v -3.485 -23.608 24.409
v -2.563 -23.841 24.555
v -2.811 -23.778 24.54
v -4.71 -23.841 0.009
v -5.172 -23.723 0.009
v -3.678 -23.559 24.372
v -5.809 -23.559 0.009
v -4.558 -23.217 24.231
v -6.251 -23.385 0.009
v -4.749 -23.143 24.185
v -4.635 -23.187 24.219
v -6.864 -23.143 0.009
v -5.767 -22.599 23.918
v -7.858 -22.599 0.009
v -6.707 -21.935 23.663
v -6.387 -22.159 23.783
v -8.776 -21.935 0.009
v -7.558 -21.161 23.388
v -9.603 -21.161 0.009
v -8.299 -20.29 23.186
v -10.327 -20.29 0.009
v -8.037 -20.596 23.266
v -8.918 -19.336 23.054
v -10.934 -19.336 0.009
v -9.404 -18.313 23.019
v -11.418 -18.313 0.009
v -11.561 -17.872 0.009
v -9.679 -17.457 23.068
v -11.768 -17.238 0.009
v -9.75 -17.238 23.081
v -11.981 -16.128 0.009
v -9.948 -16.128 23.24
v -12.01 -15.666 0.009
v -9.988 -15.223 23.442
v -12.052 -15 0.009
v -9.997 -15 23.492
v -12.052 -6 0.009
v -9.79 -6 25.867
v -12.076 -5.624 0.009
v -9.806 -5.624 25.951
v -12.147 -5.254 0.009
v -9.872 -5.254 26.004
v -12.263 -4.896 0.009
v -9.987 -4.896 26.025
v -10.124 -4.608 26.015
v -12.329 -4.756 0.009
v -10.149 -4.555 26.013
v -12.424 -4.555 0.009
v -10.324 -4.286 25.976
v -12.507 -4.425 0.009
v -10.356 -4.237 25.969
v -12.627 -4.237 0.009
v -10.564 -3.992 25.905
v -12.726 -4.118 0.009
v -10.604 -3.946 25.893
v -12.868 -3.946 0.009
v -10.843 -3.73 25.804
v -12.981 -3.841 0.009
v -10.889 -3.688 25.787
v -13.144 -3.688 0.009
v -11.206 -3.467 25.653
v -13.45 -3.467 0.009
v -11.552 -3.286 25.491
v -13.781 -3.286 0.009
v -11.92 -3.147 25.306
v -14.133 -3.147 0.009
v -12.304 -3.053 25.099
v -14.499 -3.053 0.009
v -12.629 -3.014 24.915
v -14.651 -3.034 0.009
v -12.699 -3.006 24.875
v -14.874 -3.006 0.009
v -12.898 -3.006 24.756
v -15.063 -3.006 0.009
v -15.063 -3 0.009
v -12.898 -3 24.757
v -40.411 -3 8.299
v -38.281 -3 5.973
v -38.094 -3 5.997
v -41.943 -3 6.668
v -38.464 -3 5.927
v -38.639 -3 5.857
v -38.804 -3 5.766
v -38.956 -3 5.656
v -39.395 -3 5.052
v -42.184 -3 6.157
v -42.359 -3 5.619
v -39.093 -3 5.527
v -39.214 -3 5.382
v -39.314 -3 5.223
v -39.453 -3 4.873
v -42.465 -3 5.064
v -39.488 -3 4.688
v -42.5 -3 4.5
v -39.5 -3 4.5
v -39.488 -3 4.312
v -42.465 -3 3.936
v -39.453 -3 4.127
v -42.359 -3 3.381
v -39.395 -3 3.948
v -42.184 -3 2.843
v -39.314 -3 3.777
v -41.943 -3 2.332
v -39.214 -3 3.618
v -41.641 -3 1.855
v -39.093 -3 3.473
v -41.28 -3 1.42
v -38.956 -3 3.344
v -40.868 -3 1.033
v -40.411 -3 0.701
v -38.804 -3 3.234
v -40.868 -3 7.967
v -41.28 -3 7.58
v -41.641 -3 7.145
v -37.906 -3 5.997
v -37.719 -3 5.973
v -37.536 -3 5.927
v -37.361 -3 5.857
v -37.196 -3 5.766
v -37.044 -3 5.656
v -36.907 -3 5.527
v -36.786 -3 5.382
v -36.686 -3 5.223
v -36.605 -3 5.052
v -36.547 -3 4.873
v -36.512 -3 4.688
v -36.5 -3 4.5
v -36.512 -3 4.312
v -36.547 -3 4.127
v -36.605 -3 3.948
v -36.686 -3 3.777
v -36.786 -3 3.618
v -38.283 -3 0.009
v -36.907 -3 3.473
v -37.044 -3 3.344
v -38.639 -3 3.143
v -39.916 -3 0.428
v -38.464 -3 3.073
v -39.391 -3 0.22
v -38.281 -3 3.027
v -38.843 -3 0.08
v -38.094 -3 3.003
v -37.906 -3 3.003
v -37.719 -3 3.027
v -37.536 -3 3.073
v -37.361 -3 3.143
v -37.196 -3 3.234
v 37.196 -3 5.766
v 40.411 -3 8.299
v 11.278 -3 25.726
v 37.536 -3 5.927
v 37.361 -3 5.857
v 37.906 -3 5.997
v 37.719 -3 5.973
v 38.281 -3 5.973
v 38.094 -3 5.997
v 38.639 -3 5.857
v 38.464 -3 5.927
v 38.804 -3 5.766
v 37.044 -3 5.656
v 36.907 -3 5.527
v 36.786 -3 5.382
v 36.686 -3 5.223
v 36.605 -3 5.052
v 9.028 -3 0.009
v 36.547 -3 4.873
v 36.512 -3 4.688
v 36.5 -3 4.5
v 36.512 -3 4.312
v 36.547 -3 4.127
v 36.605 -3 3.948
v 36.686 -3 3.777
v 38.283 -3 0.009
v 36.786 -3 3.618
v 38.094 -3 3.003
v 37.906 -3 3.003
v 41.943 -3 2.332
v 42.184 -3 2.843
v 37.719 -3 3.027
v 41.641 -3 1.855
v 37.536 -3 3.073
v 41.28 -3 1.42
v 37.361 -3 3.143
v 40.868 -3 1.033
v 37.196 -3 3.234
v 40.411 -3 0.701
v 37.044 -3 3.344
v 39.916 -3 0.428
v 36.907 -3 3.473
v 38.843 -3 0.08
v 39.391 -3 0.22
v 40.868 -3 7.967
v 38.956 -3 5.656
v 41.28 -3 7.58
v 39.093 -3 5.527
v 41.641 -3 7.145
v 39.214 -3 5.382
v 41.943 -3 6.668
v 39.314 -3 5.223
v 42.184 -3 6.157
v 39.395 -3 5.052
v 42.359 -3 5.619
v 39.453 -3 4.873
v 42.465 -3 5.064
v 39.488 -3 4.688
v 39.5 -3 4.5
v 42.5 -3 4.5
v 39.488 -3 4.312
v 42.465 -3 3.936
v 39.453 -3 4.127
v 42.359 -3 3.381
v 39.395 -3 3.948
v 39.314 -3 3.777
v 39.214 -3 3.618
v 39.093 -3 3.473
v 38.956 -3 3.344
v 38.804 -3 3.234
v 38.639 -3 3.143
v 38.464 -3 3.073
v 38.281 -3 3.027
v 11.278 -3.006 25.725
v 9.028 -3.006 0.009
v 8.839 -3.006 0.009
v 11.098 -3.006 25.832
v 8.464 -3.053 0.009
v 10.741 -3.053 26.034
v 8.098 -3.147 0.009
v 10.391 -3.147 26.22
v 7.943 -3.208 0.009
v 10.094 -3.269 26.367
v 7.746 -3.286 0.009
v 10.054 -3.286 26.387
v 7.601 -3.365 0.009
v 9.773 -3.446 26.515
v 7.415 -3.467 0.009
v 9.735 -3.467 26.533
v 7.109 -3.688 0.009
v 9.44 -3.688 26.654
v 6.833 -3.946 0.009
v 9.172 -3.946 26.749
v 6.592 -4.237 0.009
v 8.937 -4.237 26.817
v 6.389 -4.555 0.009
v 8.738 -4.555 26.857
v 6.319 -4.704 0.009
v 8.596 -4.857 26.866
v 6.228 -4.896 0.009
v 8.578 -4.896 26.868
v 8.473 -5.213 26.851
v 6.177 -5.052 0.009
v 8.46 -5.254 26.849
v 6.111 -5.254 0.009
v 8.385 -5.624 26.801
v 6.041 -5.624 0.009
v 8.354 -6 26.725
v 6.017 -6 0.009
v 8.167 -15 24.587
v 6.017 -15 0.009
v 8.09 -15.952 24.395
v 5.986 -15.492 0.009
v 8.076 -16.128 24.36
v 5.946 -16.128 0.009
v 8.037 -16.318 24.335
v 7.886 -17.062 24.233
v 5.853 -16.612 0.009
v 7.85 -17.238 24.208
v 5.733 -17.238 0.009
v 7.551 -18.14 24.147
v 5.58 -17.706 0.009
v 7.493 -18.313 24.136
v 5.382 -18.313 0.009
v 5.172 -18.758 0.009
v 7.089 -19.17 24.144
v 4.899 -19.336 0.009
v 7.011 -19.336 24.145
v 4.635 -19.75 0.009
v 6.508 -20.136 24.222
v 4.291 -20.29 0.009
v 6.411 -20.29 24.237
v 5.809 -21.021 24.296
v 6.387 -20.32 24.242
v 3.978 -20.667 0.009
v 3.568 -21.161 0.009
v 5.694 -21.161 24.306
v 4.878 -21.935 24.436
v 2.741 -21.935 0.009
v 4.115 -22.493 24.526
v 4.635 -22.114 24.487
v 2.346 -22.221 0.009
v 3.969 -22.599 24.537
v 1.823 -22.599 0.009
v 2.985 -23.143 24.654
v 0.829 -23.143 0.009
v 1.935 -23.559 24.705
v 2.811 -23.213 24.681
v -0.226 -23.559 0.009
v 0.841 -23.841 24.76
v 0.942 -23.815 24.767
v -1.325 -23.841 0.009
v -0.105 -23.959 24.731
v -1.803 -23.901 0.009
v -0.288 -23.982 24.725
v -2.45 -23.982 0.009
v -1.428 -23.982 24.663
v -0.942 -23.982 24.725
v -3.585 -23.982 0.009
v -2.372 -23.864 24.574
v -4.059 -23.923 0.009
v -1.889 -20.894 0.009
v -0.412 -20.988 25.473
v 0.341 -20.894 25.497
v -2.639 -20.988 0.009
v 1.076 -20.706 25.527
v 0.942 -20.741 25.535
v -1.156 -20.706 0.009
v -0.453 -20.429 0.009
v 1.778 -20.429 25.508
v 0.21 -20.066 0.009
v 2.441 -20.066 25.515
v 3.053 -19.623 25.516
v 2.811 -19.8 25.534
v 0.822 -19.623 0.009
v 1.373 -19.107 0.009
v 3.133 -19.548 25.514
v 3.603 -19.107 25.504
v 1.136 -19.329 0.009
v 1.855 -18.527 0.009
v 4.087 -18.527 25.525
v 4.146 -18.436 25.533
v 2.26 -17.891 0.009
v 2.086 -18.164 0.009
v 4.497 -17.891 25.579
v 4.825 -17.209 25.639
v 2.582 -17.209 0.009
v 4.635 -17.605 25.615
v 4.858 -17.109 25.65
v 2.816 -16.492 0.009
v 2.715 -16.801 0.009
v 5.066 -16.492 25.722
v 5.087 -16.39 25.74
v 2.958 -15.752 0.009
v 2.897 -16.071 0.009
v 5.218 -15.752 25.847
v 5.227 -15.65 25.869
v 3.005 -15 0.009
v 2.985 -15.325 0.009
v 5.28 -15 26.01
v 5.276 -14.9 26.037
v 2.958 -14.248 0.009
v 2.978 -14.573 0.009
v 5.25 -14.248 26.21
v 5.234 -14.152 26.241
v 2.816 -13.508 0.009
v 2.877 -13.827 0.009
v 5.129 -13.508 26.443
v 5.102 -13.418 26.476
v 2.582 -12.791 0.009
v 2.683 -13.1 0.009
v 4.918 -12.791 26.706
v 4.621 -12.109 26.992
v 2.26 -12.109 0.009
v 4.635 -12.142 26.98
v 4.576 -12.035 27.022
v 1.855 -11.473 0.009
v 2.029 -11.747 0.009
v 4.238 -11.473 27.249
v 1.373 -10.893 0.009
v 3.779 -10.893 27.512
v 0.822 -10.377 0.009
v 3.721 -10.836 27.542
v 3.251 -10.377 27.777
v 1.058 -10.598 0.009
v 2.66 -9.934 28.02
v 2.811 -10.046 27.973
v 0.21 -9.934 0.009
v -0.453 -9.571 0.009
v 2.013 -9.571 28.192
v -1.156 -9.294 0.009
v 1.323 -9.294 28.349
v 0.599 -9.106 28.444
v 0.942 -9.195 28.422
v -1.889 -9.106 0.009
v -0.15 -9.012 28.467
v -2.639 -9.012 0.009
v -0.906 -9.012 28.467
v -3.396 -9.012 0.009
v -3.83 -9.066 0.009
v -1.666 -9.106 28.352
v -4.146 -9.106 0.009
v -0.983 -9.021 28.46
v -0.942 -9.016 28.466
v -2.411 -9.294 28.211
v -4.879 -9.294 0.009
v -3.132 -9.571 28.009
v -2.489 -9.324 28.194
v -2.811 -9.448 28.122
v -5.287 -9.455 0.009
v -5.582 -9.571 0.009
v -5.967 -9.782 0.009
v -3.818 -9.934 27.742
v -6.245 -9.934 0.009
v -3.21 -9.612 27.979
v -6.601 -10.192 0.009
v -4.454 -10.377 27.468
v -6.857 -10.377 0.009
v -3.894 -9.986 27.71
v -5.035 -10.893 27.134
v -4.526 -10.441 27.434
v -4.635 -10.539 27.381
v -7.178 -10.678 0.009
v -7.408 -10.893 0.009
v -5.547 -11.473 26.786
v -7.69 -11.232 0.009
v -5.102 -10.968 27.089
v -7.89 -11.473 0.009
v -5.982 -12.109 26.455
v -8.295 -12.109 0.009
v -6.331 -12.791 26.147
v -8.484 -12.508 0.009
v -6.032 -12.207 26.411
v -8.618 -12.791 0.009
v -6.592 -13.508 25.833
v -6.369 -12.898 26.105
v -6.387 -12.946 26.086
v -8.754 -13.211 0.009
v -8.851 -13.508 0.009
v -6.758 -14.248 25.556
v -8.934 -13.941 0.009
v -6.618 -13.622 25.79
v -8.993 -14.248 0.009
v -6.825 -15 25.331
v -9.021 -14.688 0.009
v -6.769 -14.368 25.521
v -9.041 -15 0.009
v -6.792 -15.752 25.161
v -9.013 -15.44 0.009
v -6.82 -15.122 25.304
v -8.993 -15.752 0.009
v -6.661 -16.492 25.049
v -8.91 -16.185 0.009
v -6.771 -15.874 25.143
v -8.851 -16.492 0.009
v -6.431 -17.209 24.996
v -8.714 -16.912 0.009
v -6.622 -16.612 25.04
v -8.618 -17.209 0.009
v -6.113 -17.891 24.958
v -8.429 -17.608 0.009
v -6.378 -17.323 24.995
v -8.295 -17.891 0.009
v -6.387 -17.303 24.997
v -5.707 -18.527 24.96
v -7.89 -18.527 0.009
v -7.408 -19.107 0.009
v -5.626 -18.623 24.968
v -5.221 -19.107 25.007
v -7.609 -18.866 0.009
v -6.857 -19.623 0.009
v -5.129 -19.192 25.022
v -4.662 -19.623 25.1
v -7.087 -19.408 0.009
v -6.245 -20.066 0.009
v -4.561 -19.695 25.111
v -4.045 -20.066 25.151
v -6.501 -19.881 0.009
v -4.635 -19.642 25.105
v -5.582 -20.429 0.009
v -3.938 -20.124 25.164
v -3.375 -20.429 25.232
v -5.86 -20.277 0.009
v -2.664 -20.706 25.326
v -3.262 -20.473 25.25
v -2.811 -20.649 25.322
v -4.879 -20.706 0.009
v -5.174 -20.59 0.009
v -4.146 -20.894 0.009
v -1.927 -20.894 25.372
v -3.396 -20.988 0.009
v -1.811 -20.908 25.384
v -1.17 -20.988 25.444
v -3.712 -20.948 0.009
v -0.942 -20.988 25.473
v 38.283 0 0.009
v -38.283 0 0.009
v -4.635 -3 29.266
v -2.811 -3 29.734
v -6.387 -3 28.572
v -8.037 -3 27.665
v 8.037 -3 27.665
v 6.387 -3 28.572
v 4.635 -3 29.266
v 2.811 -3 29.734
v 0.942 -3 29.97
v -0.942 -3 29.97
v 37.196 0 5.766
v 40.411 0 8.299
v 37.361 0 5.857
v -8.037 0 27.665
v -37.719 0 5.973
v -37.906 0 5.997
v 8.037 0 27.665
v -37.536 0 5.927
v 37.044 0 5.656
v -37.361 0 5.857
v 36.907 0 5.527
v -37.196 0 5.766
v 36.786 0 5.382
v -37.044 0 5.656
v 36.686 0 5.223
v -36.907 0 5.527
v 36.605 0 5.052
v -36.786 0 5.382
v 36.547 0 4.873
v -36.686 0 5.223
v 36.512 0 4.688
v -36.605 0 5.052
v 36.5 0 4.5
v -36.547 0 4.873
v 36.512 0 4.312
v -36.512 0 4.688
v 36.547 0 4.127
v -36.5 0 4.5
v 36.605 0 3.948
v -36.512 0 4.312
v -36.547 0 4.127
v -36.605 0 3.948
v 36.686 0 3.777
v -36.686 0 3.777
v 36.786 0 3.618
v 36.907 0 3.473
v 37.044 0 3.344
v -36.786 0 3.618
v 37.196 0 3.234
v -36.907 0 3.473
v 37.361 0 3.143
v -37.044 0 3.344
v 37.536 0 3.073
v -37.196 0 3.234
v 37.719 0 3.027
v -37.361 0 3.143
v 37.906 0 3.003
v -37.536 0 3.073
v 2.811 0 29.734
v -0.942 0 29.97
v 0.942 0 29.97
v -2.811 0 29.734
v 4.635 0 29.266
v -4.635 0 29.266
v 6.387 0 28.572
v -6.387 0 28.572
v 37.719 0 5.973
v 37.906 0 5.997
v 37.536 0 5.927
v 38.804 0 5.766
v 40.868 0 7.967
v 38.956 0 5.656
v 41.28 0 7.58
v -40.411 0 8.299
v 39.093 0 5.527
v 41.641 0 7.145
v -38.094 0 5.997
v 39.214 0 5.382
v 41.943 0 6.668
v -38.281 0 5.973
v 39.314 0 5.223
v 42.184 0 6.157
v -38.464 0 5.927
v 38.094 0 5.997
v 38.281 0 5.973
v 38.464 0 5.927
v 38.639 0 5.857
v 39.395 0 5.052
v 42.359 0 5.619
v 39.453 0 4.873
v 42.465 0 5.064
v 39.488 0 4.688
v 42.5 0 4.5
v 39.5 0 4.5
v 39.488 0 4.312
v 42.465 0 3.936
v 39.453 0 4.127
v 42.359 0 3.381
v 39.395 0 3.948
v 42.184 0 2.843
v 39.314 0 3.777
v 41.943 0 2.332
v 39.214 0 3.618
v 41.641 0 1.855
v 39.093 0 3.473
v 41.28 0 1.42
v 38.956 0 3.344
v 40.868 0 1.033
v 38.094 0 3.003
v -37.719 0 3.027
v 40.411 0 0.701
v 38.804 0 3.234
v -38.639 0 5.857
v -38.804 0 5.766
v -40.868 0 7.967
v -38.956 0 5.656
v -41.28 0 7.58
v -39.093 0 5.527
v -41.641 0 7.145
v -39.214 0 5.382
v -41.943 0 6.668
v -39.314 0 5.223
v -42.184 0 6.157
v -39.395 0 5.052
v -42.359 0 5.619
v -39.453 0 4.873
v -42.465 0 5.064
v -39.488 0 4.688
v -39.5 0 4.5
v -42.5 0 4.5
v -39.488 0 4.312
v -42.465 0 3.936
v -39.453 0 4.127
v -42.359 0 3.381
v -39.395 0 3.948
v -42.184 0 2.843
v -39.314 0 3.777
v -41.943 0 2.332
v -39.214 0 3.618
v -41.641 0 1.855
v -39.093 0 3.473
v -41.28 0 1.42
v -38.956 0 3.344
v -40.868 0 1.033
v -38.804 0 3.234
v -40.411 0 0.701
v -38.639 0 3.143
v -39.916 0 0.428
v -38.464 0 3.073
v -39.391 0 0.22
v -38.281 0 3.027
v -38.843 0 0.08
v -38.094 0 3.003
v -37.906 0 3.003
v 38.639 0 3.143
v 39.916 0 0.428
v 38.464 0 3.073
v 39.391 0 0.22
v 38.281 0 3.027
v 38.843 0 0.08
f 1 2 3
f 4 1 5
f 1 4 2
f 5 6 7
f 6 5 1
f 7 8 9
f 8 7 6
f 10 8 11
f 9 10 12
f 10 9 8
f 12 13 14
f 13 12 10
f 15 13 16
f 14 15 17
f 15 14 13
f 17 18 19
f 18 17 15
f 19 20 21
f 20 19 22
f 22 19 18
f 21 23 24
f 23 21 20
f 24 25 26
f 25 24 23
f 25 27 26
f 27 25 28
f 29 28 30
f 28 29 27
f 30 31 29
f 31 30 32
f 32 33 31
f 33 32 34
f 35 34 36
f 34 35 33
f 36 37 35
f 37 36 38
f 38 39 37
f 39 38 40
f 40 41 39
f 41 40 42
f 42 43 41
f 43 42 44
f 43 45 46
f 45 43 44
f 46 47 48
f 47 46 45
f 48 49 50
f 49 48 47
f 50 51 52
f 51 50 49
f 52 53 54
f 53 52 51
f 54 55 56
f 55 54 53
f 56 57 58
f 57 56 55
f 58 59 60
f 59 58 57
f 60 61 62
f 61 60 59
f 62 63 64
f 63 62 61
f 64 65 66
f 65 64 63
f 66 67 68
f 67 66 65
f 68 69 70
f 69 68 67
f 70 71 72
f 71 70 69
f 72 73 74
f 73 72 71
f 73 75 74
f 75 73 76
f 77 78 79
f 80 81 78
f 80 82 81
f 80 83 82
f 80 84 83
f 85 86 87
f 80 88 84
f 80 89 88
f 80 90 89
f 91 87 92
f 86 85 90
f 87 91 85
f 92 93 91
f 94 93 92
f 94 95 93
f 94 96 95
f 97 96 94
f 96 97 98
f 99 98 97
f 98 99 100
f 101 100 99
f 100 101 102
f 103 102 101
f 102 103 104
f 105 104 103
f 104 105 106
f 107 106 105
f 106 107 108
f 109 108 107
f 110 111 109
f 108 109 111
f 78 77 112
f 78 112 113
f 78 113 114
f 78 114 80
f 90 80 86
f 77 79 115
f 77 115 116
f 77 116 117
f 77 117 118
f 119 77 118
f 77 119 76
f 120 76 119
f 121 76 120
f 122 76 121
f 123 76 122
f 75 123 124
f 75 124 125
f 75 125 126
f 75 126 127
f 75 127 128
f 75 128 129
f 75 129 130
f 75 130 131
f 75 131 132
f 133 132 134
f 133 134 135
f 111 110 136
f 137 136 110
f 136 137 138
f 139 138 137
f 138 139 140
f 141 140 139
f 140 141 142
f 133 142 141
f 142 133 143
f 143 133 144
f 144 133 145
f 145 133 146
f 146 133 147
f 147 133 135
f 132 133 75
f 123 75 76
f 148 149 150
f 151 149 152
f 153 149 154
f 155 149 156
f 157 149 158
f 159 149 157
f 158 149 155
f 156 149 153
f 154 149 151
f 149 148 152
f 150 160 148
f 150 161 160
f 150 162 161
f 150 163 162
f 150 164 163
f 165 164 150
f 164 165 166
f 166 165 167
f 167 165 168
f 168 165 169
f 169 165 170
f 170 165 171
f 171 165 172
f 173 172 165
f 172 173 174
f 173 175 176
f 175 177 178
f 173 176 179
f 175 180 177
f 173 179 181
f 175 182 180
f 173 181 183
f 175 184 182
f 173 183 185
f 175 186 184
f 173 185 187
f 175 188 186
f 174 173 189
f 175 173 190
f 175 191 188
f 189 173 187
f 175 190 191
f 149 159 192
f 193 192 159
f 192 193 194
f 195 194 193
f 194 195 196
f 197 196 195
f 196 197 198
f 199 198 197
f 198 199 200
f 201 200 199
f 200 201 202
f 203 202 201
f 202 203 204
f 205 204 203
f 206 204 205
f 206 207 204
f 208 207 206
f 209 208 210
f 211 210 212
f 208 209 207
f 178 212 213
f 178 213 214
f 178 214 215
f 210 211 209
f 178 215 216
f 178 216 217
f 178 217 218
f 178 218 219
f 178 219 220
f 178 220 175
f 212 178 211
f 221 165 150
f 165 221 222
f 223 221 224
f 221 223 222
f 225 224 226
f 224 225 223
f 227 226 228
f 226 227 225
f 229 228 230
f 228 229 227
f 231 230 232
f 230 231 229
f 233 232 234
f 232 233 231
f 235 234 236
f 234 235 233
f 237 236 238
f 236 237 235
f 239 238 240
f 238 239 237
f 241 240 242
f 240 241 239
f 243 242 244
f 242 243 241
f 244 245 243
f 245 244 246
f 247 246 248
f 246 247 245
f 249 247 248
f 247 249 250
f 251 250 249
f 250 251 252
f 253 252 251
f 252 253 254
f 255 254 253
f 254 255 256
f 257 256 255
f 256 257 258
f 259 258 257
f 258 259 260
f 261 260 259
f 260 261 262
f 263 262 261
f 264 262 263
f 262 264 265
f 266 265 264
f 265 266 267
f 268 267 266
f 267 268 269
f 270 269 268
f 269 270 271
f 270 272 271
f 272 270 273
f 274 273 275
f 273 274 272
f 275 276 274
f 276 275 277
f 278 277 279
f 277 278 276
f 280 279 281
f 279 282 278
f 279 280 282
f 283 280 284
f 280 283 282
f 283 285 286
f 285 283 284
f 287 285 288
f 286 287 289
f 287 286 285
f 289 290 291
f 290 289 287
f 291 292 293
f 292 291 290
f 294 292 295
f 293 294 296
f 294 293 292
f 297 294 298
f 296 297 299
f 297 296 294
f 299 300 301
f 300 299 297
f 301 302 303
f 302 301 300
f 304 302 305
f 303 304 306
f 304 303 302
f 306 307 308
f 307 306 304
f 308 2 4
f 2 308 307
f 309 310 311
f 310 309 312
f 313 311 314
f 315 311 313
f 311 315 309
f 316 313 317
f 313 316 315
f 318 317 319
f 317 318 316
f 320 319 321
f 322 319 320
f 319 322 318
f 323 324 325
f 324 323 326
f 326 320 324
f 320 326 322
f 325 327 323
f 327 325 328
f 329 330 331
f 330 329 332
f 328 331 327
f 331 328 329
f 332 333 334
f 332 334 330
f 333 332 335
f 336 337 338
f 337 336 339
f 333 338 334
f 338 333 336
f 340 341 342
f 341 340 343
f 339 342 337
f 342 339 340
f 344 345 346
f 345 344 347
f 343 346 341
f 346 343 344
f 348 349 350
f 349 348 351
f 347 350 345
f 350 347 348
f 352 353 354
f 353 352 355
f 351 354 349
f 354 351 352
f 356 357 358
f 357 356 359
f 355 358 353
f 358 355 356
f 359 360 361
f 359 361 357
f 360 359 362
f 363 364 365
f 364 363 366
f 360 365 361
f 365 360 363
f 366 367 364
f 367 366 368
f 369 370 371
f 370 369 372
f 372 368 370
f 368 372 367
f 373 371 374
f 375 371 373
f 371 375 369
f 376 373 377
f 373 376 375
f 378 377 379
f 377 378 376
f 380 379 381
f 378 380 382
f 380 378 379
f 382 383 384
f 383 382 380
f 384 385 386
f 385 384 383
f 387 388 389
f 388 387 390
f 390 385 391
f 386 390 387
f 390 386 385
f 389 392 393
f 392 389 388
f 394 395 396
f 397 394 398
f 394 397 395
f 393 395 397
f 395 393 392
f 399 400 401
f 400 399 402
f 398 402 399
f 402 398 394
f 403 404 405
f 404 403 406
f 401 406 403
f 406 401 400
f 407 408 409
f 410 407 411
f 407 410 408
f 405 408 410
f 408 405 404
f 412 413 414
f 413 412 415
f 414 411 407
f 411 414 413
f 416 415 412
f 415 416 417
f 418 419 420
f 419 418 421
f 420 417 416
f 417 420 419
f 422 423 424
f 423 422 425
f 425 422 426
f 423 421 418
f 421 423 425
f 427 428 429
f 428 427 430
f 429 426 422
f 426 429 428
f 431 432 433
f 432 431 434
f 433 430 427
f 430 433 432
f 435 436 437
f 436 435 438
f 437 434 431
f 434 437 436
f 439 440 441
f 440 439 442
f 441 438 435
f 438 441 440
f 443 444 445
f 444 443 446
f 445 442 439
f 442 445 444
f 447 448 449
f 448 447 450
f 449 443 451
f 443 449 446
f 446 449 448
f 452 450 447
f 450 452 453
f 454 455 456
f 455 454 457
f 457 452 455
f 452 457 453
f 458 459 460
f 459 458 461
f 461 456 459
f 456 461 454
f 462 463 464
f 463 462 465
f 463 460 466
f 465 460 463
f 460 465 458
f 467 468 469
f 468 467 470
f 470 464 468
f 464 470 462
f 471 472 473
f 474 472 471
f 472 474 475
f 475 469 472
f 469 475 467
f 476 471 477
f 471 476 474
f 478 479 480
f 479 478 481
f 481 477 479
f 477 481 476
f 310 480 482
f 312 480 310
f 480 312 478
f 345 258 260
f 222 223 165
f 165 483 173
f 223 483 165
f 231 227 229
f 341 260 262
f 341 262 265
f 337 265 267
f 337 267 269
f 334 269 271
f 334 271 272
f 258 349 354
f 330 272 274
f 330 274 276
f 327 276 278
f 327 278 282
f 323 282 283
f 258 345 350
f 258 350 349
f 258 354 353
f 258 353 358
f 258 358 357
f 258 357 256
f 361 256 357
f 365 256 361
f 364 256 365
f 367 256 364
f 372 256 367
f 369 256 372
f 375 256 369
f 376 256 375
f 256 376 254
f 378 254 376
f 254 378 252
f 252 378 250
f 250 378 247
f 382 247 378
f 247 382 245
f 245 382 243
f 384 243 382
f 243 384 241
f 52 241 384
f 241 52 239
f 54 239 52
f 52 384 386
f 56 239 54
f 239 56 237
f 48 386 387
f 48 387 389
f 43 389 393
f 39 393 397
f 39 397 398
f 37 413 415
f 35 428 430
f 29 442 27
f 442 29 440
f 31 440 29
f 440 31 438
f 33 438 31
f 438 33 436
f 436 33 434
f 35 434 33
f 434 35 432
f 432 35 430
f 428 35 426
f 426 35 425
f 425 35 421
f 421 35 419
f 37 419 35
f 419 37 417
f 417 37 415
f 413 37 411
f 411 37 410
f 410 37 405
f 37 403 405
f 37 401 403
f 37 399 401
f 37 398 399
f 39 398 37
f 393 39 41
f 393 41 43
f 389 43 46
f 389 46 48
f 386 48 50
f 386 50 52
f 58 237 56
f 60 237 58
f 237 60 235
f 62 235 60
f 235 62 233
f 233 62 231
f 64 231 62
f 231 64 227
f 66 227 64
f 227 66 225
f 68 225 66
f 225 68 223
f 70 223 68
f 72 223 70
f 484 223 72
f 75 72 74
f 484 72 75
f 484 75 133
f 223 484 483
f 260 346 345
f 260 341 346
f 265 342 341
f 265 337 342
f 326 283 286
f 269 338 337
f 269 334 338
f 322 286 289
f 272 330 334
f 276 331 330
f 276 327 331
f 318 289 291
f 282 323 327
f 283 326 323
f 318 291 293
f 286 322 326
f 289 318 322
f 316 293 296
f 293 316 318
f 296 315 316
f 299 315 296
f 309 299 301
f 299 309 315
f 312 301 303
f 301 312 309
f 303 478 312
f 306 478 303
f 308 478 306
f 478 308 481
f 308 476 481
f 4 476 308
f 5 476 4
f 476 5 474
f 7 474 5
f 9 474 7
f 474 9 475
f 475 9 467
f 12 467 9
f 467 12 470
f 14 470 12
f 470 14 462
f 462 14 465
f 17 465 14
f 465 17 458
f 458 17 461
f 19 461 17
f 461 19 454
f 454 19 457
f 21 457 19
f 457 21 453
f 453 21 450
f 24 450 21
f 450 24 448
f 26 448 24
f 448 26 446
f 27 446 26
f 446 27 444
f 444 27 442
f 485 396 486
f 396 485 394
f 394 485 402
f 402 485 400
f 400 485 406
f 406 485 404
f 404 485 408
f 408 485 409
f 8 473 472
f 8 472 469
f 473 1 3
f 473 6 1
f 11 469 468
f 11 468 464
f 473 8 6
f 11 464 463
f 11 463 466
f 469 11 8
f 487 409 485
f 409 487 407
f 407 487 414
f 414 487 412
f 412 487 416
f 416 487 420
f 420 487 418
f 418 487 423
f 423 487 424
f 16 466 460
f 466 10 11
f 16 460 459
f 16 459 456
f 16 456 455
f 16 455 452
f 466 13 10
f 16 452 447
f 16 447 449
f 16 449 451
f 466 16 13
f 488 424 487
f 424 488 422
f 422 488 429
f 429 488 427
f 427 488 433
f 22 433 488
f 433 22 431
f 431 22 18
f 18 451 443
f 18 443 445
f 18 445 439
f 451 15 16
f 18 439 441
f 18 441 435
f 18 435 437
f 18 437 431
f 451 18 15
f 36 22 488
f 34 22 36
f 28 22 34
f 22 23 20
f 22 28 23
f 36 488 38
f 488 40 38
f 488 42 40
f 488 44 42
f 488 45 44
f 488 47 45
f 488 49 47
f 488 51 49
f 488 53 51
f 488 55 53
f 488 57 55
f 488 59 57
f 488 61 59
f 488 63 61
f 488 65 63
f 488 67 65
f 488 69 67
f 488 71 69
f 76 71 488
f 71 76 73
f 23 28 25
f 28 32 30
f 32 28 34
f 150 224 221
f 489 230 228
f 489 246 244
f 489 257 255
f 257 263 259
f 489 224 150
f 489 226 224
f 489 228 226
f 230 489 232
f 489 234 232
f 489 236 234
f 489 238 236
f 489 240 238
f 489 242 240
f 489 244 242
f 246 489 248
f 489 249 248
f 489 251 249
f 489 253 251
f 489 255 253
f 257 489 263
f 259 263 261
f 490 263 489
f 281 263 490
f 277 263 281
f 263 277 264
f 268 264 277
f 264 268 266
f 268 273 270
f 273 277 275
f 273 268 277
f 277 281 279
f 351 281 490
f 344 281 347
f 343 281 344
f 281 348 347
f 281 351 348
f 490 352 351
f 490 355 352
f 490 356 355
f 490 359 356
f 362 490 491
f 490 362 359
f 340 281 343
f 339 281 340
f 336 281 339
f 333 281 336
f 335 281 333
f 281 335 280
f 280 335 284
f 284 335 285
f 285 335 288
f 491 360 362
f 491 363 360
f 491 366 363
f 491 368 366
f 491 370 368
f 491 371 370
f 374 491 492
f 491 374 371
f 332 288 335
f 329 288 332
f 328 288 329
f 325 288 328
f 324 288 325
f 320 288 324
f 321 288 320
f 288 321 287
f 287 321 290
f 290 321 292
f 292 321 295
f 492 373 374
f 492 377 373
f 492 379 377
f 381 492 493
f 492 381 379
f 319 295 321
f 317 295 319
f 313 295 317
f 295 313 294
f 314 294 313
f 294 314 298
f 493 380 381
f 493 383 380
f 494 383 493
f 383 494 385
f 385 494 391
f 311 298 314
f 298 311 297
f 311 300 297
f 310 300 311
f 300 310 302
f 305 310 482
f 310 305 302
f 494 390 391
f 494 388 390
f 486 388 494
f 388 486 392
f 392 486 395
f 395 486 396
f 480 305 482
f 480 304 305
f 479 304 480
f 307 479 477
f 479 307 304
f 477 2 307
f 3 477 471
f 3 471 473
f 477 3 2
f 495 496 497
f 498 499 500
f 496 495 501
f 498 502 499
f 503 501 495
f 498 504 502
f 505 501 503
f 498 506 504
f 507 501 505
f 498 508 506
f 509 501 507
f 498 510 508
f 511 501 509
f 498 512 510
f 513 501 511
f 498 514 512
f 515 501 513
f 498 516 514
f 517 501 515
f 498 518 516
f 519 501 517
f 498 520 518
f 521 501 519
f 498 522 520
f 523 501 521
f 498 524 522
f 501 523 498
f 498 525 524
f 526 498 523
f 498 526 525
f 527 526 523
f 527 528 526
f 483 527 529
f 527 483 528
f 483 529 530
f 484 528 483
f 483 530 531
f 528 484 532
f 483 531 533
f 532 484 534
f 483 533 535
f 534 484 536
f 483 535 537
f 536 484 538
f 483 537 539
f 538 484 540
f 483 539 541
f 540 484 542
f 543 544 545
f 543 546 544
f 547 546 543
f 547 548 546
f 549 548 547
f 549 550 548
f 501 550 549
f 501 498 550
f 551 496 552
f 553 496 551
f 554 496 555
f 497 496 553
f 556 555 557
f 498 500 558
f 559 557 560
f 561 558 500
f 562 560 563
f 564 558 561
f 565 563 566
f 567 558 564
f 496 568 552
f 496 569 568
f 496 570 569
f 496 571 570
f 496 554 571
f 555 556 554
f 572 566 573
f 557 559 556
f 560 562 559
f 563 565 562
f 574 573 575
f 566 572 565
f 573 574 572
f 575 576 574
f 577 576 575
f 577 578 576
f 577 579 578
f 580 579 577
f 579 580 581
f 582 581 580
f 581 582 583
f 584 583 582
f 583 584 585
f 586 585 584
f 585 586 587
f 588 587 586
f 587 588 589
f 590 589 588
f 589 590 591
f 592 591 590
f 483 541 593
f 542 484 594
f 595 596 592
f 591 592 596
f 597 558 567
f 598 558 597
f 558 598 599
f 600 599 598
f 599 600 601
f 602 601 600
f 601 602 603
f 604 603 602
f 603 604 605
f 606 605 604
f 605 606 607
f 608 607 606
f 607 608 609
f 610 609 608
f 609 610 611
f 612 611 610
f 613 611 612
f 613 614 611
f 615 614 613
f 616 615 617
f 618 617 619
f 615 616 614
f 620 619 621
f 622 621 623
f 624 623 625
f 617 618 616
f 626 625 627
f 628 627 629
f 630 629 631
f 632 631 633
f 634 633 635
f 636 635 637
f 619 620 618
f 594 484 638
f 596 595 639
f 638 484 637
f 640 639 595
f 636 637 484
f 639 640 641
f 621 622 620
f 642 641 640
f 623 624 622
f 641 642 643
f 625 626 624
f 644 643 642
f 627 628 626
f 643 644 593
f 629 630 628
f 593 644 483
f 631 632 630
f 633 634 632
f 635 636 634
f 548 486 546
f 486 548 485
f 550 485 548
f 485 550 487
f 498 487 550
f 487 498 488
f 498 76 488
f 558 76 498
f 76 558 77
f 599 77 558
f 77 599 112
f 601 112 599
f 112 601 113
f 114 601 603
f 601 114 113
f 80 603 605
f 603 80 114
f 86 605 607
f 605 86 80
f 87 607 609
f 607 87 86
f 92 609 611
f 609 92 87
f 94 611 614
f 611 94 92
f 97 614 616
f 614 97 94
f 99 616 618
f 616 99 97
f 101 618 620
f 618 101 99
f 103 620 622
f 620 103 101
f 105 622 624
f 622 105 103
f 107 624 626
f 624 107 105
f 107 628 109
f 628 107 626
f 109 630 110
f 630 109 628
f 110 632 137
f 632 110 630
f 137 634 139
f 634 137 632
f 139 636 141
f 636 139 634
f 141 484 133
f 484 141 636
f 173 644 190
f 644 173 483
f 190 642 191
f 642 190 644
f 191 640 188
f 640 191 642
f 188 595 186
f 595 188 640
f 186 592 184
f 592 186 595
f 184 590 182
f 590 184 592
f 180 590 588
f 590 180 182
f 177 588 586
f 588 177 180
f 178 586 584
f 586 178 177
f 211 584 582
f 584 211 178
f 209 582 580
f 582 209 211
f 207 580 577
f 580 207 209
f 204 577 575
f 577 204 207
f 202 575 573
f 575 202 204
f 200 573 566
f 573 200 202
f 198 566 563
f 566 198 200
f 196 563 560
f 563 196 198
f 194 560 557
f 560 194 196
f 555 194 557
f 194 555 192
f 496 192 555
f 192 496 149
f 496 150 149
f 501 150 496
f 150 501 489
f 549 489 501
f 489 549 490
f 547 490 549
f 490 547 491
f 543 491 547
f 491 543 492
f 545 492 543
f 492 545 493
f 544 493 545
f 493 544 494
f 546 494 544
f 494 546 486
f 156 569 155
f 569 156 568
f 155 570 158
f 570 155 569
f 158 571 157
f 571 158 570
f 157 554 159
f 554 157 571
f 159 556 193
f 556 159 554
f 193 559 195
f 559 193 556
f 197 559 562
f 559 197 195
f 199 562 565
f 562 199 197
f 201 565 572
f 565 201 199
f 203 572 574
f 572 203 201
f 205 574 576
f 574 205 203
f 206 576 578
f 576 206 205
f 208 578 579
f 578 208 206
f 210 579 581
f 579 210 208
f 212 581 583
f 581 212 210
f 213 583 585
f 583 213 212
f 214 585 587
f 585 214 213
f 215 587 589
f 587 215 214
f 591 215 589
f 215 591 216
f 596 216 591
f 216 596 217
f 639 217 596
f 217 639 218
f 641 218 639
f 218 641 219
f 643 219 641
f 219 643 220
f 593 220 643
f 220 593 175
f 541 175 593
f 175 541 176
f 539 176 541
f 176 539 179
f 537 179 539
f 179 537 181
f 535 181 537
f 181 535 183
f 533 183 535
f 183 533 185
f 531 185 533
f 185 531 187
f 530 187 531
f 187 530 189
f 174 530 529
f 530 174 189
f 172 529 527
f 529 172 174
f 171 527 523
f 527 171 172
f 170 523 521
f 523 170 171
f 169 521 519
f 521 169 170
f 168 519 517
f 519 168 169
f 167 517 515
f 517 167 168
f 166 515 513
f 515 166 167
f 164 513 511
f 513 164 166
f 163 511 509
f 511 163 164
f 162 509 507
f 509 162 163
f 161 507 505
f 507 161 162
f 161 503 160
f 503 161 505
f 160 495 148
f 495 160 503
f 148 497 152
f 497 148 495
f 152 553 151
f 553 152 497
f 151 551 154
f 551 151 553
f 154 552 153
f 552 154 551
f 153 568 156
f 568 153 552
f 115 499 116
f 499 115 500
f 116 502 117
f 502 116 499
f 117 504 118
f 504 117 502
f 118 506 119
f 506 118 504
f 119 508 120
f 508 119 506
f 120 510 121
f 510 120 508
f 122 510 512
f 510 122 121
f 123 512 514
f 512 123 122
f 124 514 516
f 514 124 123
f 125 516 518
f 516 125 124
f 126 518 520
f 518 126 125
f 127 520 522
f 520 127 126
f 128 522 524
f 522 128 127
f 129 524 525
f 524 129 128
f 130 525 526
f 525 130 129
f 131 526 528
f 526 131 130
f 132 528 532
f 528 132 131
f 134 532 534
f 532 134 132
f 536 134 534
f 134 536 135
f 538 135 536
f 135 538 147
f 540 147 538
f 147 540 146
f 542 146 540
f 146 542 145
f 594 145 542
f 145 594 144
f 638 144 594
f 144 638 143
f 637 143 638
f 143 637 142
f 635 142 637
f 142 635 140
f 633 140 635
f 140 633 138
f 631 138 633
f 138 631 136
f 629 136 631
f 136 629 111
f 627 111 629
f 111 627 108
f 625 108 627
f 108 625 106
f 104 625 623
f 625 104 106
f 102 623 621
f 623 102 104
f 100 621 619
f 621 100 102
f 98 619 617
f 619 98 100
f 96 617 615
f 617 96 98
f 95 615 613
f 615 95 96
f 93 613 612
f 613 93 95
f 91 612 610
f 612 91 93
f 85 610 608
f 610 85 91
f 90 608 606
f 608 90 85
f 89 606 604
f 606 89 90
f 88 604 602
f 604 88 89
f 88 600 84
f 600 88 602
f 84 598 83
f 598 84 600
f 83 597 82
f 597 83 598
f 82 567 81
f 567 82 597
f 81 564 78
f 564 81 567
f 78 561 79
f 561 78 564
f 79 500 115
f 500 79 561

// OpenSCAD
// Thickness of the overall print
thickness = 3;
// Diameter of the rack ear mounting screws
screwDiameter = 3;
// Space between each of the rack ear mounting screws
screwSpacing = 76;
// Angle to rotate the mounting hole in order to hold the lamp level
mountHoleAngle = 5;
// 12mm for standard articulating lamps
mountHoleDiameter = 12;
// Height of the mounting shaft of your lamp
mountHoleHeight = 30;
// Distance from the mounting plate to place the mount hole
mountHoleOffset = 3;
// Set to true to mirror the bracket
mirrorBracket = true;

screwRadius = screwDiameter / 2;
mountHoleRadius = mountHoleDiameter / 2;

$fn = 50;

module plate_shape()
{
    difference()
    {
        hull()
        {
            circle(screwRadius + thickness);

            translate([screwSpacing, 0, 0])
                circle(screwRadius + thickness);
            
            translate([screwSpacing / 2, -(mountHoleHeight / 2) + screwRadius + thickness, 0])
                circle(mountHoleHeight / 2);
        }

        circle(screwRadius);

        translate([screwSpacing, 0, 0])
            circle(screwRadius);
    }
}

module mount_shape()
{
    difference()
    {
        union()
        {
            // Outer curve
            circle(mountHoleRadius + thickness);

            // Square base
            translate([
                0, (mountHoleRadius + mountHoleOffset + thickness) / 2, 0
            ])
                square([
                    (mountHoleRadius + thickness) * 2,
                    mountHoleRadius + mountHoleOffset + thickness
                ], true);

            // Right hand corner
            translate([
                mountHoleRadius + (thickness * 1.5),
                mountHoleRadius + mountHoleOffset + (thickness / 2),
                0
            ])
                difference()
            {
                square(thickness, true);
                translate([thickness / 2, -thickness / 2, 0])
                    circle(thickness);
            }

            // Left hand corner
            translate([
                -mountHoleRadius - (thickness * 1.5),
                mountHoleRadius + mountHoleOffset + (thickness / 2),
                0
            ])
                difference()
            {
                square(thickness, true);
                translate([-thickness / 2, -thickness / 2, 0])
                circle(thickness);
            }
        }

        circle(mountHoleRadius);
    }
}

module bracket()
{
    translate([0, 0, screwRadius + thickness])
        rotate([-90, 0, 0])
    {
        linear_extrude(thickness)
            plate_shape();

        intersection()
        {
            translate([
                screwSpacing / 2,
                -mountHoleHeight,
                mountHoleDiameter + mountHoleOffset
            ])
                rotate([-90, 0, -mountHoleAngle])
                linear_extrude(mountHoleHeight * 2, convexity = 5)
                mount_shape();

            linear_extrude(mountHoleHeight + mountHoleOffset)
                plate_shape();
            
            translate([0, 0, thickness])
                multmatrix([
                    [1, 0, 0, 0],
                    [0, 1, 0.25, 0],
                    [0, 0, 1, 0],
                ])
                linear_extrude(mountHoleHeight + mountHoleOffset, convexity = 5)
                plate_shape();
        }
    }
}

if (mirrorBracket)
{
    translate([screwSpacing / 2, 0, 0])
        rotate([0, 0, 180])
        bracket();
}
else
{
    translate([-screwSpacing / 2, 0, 0])
        bracket();
}
